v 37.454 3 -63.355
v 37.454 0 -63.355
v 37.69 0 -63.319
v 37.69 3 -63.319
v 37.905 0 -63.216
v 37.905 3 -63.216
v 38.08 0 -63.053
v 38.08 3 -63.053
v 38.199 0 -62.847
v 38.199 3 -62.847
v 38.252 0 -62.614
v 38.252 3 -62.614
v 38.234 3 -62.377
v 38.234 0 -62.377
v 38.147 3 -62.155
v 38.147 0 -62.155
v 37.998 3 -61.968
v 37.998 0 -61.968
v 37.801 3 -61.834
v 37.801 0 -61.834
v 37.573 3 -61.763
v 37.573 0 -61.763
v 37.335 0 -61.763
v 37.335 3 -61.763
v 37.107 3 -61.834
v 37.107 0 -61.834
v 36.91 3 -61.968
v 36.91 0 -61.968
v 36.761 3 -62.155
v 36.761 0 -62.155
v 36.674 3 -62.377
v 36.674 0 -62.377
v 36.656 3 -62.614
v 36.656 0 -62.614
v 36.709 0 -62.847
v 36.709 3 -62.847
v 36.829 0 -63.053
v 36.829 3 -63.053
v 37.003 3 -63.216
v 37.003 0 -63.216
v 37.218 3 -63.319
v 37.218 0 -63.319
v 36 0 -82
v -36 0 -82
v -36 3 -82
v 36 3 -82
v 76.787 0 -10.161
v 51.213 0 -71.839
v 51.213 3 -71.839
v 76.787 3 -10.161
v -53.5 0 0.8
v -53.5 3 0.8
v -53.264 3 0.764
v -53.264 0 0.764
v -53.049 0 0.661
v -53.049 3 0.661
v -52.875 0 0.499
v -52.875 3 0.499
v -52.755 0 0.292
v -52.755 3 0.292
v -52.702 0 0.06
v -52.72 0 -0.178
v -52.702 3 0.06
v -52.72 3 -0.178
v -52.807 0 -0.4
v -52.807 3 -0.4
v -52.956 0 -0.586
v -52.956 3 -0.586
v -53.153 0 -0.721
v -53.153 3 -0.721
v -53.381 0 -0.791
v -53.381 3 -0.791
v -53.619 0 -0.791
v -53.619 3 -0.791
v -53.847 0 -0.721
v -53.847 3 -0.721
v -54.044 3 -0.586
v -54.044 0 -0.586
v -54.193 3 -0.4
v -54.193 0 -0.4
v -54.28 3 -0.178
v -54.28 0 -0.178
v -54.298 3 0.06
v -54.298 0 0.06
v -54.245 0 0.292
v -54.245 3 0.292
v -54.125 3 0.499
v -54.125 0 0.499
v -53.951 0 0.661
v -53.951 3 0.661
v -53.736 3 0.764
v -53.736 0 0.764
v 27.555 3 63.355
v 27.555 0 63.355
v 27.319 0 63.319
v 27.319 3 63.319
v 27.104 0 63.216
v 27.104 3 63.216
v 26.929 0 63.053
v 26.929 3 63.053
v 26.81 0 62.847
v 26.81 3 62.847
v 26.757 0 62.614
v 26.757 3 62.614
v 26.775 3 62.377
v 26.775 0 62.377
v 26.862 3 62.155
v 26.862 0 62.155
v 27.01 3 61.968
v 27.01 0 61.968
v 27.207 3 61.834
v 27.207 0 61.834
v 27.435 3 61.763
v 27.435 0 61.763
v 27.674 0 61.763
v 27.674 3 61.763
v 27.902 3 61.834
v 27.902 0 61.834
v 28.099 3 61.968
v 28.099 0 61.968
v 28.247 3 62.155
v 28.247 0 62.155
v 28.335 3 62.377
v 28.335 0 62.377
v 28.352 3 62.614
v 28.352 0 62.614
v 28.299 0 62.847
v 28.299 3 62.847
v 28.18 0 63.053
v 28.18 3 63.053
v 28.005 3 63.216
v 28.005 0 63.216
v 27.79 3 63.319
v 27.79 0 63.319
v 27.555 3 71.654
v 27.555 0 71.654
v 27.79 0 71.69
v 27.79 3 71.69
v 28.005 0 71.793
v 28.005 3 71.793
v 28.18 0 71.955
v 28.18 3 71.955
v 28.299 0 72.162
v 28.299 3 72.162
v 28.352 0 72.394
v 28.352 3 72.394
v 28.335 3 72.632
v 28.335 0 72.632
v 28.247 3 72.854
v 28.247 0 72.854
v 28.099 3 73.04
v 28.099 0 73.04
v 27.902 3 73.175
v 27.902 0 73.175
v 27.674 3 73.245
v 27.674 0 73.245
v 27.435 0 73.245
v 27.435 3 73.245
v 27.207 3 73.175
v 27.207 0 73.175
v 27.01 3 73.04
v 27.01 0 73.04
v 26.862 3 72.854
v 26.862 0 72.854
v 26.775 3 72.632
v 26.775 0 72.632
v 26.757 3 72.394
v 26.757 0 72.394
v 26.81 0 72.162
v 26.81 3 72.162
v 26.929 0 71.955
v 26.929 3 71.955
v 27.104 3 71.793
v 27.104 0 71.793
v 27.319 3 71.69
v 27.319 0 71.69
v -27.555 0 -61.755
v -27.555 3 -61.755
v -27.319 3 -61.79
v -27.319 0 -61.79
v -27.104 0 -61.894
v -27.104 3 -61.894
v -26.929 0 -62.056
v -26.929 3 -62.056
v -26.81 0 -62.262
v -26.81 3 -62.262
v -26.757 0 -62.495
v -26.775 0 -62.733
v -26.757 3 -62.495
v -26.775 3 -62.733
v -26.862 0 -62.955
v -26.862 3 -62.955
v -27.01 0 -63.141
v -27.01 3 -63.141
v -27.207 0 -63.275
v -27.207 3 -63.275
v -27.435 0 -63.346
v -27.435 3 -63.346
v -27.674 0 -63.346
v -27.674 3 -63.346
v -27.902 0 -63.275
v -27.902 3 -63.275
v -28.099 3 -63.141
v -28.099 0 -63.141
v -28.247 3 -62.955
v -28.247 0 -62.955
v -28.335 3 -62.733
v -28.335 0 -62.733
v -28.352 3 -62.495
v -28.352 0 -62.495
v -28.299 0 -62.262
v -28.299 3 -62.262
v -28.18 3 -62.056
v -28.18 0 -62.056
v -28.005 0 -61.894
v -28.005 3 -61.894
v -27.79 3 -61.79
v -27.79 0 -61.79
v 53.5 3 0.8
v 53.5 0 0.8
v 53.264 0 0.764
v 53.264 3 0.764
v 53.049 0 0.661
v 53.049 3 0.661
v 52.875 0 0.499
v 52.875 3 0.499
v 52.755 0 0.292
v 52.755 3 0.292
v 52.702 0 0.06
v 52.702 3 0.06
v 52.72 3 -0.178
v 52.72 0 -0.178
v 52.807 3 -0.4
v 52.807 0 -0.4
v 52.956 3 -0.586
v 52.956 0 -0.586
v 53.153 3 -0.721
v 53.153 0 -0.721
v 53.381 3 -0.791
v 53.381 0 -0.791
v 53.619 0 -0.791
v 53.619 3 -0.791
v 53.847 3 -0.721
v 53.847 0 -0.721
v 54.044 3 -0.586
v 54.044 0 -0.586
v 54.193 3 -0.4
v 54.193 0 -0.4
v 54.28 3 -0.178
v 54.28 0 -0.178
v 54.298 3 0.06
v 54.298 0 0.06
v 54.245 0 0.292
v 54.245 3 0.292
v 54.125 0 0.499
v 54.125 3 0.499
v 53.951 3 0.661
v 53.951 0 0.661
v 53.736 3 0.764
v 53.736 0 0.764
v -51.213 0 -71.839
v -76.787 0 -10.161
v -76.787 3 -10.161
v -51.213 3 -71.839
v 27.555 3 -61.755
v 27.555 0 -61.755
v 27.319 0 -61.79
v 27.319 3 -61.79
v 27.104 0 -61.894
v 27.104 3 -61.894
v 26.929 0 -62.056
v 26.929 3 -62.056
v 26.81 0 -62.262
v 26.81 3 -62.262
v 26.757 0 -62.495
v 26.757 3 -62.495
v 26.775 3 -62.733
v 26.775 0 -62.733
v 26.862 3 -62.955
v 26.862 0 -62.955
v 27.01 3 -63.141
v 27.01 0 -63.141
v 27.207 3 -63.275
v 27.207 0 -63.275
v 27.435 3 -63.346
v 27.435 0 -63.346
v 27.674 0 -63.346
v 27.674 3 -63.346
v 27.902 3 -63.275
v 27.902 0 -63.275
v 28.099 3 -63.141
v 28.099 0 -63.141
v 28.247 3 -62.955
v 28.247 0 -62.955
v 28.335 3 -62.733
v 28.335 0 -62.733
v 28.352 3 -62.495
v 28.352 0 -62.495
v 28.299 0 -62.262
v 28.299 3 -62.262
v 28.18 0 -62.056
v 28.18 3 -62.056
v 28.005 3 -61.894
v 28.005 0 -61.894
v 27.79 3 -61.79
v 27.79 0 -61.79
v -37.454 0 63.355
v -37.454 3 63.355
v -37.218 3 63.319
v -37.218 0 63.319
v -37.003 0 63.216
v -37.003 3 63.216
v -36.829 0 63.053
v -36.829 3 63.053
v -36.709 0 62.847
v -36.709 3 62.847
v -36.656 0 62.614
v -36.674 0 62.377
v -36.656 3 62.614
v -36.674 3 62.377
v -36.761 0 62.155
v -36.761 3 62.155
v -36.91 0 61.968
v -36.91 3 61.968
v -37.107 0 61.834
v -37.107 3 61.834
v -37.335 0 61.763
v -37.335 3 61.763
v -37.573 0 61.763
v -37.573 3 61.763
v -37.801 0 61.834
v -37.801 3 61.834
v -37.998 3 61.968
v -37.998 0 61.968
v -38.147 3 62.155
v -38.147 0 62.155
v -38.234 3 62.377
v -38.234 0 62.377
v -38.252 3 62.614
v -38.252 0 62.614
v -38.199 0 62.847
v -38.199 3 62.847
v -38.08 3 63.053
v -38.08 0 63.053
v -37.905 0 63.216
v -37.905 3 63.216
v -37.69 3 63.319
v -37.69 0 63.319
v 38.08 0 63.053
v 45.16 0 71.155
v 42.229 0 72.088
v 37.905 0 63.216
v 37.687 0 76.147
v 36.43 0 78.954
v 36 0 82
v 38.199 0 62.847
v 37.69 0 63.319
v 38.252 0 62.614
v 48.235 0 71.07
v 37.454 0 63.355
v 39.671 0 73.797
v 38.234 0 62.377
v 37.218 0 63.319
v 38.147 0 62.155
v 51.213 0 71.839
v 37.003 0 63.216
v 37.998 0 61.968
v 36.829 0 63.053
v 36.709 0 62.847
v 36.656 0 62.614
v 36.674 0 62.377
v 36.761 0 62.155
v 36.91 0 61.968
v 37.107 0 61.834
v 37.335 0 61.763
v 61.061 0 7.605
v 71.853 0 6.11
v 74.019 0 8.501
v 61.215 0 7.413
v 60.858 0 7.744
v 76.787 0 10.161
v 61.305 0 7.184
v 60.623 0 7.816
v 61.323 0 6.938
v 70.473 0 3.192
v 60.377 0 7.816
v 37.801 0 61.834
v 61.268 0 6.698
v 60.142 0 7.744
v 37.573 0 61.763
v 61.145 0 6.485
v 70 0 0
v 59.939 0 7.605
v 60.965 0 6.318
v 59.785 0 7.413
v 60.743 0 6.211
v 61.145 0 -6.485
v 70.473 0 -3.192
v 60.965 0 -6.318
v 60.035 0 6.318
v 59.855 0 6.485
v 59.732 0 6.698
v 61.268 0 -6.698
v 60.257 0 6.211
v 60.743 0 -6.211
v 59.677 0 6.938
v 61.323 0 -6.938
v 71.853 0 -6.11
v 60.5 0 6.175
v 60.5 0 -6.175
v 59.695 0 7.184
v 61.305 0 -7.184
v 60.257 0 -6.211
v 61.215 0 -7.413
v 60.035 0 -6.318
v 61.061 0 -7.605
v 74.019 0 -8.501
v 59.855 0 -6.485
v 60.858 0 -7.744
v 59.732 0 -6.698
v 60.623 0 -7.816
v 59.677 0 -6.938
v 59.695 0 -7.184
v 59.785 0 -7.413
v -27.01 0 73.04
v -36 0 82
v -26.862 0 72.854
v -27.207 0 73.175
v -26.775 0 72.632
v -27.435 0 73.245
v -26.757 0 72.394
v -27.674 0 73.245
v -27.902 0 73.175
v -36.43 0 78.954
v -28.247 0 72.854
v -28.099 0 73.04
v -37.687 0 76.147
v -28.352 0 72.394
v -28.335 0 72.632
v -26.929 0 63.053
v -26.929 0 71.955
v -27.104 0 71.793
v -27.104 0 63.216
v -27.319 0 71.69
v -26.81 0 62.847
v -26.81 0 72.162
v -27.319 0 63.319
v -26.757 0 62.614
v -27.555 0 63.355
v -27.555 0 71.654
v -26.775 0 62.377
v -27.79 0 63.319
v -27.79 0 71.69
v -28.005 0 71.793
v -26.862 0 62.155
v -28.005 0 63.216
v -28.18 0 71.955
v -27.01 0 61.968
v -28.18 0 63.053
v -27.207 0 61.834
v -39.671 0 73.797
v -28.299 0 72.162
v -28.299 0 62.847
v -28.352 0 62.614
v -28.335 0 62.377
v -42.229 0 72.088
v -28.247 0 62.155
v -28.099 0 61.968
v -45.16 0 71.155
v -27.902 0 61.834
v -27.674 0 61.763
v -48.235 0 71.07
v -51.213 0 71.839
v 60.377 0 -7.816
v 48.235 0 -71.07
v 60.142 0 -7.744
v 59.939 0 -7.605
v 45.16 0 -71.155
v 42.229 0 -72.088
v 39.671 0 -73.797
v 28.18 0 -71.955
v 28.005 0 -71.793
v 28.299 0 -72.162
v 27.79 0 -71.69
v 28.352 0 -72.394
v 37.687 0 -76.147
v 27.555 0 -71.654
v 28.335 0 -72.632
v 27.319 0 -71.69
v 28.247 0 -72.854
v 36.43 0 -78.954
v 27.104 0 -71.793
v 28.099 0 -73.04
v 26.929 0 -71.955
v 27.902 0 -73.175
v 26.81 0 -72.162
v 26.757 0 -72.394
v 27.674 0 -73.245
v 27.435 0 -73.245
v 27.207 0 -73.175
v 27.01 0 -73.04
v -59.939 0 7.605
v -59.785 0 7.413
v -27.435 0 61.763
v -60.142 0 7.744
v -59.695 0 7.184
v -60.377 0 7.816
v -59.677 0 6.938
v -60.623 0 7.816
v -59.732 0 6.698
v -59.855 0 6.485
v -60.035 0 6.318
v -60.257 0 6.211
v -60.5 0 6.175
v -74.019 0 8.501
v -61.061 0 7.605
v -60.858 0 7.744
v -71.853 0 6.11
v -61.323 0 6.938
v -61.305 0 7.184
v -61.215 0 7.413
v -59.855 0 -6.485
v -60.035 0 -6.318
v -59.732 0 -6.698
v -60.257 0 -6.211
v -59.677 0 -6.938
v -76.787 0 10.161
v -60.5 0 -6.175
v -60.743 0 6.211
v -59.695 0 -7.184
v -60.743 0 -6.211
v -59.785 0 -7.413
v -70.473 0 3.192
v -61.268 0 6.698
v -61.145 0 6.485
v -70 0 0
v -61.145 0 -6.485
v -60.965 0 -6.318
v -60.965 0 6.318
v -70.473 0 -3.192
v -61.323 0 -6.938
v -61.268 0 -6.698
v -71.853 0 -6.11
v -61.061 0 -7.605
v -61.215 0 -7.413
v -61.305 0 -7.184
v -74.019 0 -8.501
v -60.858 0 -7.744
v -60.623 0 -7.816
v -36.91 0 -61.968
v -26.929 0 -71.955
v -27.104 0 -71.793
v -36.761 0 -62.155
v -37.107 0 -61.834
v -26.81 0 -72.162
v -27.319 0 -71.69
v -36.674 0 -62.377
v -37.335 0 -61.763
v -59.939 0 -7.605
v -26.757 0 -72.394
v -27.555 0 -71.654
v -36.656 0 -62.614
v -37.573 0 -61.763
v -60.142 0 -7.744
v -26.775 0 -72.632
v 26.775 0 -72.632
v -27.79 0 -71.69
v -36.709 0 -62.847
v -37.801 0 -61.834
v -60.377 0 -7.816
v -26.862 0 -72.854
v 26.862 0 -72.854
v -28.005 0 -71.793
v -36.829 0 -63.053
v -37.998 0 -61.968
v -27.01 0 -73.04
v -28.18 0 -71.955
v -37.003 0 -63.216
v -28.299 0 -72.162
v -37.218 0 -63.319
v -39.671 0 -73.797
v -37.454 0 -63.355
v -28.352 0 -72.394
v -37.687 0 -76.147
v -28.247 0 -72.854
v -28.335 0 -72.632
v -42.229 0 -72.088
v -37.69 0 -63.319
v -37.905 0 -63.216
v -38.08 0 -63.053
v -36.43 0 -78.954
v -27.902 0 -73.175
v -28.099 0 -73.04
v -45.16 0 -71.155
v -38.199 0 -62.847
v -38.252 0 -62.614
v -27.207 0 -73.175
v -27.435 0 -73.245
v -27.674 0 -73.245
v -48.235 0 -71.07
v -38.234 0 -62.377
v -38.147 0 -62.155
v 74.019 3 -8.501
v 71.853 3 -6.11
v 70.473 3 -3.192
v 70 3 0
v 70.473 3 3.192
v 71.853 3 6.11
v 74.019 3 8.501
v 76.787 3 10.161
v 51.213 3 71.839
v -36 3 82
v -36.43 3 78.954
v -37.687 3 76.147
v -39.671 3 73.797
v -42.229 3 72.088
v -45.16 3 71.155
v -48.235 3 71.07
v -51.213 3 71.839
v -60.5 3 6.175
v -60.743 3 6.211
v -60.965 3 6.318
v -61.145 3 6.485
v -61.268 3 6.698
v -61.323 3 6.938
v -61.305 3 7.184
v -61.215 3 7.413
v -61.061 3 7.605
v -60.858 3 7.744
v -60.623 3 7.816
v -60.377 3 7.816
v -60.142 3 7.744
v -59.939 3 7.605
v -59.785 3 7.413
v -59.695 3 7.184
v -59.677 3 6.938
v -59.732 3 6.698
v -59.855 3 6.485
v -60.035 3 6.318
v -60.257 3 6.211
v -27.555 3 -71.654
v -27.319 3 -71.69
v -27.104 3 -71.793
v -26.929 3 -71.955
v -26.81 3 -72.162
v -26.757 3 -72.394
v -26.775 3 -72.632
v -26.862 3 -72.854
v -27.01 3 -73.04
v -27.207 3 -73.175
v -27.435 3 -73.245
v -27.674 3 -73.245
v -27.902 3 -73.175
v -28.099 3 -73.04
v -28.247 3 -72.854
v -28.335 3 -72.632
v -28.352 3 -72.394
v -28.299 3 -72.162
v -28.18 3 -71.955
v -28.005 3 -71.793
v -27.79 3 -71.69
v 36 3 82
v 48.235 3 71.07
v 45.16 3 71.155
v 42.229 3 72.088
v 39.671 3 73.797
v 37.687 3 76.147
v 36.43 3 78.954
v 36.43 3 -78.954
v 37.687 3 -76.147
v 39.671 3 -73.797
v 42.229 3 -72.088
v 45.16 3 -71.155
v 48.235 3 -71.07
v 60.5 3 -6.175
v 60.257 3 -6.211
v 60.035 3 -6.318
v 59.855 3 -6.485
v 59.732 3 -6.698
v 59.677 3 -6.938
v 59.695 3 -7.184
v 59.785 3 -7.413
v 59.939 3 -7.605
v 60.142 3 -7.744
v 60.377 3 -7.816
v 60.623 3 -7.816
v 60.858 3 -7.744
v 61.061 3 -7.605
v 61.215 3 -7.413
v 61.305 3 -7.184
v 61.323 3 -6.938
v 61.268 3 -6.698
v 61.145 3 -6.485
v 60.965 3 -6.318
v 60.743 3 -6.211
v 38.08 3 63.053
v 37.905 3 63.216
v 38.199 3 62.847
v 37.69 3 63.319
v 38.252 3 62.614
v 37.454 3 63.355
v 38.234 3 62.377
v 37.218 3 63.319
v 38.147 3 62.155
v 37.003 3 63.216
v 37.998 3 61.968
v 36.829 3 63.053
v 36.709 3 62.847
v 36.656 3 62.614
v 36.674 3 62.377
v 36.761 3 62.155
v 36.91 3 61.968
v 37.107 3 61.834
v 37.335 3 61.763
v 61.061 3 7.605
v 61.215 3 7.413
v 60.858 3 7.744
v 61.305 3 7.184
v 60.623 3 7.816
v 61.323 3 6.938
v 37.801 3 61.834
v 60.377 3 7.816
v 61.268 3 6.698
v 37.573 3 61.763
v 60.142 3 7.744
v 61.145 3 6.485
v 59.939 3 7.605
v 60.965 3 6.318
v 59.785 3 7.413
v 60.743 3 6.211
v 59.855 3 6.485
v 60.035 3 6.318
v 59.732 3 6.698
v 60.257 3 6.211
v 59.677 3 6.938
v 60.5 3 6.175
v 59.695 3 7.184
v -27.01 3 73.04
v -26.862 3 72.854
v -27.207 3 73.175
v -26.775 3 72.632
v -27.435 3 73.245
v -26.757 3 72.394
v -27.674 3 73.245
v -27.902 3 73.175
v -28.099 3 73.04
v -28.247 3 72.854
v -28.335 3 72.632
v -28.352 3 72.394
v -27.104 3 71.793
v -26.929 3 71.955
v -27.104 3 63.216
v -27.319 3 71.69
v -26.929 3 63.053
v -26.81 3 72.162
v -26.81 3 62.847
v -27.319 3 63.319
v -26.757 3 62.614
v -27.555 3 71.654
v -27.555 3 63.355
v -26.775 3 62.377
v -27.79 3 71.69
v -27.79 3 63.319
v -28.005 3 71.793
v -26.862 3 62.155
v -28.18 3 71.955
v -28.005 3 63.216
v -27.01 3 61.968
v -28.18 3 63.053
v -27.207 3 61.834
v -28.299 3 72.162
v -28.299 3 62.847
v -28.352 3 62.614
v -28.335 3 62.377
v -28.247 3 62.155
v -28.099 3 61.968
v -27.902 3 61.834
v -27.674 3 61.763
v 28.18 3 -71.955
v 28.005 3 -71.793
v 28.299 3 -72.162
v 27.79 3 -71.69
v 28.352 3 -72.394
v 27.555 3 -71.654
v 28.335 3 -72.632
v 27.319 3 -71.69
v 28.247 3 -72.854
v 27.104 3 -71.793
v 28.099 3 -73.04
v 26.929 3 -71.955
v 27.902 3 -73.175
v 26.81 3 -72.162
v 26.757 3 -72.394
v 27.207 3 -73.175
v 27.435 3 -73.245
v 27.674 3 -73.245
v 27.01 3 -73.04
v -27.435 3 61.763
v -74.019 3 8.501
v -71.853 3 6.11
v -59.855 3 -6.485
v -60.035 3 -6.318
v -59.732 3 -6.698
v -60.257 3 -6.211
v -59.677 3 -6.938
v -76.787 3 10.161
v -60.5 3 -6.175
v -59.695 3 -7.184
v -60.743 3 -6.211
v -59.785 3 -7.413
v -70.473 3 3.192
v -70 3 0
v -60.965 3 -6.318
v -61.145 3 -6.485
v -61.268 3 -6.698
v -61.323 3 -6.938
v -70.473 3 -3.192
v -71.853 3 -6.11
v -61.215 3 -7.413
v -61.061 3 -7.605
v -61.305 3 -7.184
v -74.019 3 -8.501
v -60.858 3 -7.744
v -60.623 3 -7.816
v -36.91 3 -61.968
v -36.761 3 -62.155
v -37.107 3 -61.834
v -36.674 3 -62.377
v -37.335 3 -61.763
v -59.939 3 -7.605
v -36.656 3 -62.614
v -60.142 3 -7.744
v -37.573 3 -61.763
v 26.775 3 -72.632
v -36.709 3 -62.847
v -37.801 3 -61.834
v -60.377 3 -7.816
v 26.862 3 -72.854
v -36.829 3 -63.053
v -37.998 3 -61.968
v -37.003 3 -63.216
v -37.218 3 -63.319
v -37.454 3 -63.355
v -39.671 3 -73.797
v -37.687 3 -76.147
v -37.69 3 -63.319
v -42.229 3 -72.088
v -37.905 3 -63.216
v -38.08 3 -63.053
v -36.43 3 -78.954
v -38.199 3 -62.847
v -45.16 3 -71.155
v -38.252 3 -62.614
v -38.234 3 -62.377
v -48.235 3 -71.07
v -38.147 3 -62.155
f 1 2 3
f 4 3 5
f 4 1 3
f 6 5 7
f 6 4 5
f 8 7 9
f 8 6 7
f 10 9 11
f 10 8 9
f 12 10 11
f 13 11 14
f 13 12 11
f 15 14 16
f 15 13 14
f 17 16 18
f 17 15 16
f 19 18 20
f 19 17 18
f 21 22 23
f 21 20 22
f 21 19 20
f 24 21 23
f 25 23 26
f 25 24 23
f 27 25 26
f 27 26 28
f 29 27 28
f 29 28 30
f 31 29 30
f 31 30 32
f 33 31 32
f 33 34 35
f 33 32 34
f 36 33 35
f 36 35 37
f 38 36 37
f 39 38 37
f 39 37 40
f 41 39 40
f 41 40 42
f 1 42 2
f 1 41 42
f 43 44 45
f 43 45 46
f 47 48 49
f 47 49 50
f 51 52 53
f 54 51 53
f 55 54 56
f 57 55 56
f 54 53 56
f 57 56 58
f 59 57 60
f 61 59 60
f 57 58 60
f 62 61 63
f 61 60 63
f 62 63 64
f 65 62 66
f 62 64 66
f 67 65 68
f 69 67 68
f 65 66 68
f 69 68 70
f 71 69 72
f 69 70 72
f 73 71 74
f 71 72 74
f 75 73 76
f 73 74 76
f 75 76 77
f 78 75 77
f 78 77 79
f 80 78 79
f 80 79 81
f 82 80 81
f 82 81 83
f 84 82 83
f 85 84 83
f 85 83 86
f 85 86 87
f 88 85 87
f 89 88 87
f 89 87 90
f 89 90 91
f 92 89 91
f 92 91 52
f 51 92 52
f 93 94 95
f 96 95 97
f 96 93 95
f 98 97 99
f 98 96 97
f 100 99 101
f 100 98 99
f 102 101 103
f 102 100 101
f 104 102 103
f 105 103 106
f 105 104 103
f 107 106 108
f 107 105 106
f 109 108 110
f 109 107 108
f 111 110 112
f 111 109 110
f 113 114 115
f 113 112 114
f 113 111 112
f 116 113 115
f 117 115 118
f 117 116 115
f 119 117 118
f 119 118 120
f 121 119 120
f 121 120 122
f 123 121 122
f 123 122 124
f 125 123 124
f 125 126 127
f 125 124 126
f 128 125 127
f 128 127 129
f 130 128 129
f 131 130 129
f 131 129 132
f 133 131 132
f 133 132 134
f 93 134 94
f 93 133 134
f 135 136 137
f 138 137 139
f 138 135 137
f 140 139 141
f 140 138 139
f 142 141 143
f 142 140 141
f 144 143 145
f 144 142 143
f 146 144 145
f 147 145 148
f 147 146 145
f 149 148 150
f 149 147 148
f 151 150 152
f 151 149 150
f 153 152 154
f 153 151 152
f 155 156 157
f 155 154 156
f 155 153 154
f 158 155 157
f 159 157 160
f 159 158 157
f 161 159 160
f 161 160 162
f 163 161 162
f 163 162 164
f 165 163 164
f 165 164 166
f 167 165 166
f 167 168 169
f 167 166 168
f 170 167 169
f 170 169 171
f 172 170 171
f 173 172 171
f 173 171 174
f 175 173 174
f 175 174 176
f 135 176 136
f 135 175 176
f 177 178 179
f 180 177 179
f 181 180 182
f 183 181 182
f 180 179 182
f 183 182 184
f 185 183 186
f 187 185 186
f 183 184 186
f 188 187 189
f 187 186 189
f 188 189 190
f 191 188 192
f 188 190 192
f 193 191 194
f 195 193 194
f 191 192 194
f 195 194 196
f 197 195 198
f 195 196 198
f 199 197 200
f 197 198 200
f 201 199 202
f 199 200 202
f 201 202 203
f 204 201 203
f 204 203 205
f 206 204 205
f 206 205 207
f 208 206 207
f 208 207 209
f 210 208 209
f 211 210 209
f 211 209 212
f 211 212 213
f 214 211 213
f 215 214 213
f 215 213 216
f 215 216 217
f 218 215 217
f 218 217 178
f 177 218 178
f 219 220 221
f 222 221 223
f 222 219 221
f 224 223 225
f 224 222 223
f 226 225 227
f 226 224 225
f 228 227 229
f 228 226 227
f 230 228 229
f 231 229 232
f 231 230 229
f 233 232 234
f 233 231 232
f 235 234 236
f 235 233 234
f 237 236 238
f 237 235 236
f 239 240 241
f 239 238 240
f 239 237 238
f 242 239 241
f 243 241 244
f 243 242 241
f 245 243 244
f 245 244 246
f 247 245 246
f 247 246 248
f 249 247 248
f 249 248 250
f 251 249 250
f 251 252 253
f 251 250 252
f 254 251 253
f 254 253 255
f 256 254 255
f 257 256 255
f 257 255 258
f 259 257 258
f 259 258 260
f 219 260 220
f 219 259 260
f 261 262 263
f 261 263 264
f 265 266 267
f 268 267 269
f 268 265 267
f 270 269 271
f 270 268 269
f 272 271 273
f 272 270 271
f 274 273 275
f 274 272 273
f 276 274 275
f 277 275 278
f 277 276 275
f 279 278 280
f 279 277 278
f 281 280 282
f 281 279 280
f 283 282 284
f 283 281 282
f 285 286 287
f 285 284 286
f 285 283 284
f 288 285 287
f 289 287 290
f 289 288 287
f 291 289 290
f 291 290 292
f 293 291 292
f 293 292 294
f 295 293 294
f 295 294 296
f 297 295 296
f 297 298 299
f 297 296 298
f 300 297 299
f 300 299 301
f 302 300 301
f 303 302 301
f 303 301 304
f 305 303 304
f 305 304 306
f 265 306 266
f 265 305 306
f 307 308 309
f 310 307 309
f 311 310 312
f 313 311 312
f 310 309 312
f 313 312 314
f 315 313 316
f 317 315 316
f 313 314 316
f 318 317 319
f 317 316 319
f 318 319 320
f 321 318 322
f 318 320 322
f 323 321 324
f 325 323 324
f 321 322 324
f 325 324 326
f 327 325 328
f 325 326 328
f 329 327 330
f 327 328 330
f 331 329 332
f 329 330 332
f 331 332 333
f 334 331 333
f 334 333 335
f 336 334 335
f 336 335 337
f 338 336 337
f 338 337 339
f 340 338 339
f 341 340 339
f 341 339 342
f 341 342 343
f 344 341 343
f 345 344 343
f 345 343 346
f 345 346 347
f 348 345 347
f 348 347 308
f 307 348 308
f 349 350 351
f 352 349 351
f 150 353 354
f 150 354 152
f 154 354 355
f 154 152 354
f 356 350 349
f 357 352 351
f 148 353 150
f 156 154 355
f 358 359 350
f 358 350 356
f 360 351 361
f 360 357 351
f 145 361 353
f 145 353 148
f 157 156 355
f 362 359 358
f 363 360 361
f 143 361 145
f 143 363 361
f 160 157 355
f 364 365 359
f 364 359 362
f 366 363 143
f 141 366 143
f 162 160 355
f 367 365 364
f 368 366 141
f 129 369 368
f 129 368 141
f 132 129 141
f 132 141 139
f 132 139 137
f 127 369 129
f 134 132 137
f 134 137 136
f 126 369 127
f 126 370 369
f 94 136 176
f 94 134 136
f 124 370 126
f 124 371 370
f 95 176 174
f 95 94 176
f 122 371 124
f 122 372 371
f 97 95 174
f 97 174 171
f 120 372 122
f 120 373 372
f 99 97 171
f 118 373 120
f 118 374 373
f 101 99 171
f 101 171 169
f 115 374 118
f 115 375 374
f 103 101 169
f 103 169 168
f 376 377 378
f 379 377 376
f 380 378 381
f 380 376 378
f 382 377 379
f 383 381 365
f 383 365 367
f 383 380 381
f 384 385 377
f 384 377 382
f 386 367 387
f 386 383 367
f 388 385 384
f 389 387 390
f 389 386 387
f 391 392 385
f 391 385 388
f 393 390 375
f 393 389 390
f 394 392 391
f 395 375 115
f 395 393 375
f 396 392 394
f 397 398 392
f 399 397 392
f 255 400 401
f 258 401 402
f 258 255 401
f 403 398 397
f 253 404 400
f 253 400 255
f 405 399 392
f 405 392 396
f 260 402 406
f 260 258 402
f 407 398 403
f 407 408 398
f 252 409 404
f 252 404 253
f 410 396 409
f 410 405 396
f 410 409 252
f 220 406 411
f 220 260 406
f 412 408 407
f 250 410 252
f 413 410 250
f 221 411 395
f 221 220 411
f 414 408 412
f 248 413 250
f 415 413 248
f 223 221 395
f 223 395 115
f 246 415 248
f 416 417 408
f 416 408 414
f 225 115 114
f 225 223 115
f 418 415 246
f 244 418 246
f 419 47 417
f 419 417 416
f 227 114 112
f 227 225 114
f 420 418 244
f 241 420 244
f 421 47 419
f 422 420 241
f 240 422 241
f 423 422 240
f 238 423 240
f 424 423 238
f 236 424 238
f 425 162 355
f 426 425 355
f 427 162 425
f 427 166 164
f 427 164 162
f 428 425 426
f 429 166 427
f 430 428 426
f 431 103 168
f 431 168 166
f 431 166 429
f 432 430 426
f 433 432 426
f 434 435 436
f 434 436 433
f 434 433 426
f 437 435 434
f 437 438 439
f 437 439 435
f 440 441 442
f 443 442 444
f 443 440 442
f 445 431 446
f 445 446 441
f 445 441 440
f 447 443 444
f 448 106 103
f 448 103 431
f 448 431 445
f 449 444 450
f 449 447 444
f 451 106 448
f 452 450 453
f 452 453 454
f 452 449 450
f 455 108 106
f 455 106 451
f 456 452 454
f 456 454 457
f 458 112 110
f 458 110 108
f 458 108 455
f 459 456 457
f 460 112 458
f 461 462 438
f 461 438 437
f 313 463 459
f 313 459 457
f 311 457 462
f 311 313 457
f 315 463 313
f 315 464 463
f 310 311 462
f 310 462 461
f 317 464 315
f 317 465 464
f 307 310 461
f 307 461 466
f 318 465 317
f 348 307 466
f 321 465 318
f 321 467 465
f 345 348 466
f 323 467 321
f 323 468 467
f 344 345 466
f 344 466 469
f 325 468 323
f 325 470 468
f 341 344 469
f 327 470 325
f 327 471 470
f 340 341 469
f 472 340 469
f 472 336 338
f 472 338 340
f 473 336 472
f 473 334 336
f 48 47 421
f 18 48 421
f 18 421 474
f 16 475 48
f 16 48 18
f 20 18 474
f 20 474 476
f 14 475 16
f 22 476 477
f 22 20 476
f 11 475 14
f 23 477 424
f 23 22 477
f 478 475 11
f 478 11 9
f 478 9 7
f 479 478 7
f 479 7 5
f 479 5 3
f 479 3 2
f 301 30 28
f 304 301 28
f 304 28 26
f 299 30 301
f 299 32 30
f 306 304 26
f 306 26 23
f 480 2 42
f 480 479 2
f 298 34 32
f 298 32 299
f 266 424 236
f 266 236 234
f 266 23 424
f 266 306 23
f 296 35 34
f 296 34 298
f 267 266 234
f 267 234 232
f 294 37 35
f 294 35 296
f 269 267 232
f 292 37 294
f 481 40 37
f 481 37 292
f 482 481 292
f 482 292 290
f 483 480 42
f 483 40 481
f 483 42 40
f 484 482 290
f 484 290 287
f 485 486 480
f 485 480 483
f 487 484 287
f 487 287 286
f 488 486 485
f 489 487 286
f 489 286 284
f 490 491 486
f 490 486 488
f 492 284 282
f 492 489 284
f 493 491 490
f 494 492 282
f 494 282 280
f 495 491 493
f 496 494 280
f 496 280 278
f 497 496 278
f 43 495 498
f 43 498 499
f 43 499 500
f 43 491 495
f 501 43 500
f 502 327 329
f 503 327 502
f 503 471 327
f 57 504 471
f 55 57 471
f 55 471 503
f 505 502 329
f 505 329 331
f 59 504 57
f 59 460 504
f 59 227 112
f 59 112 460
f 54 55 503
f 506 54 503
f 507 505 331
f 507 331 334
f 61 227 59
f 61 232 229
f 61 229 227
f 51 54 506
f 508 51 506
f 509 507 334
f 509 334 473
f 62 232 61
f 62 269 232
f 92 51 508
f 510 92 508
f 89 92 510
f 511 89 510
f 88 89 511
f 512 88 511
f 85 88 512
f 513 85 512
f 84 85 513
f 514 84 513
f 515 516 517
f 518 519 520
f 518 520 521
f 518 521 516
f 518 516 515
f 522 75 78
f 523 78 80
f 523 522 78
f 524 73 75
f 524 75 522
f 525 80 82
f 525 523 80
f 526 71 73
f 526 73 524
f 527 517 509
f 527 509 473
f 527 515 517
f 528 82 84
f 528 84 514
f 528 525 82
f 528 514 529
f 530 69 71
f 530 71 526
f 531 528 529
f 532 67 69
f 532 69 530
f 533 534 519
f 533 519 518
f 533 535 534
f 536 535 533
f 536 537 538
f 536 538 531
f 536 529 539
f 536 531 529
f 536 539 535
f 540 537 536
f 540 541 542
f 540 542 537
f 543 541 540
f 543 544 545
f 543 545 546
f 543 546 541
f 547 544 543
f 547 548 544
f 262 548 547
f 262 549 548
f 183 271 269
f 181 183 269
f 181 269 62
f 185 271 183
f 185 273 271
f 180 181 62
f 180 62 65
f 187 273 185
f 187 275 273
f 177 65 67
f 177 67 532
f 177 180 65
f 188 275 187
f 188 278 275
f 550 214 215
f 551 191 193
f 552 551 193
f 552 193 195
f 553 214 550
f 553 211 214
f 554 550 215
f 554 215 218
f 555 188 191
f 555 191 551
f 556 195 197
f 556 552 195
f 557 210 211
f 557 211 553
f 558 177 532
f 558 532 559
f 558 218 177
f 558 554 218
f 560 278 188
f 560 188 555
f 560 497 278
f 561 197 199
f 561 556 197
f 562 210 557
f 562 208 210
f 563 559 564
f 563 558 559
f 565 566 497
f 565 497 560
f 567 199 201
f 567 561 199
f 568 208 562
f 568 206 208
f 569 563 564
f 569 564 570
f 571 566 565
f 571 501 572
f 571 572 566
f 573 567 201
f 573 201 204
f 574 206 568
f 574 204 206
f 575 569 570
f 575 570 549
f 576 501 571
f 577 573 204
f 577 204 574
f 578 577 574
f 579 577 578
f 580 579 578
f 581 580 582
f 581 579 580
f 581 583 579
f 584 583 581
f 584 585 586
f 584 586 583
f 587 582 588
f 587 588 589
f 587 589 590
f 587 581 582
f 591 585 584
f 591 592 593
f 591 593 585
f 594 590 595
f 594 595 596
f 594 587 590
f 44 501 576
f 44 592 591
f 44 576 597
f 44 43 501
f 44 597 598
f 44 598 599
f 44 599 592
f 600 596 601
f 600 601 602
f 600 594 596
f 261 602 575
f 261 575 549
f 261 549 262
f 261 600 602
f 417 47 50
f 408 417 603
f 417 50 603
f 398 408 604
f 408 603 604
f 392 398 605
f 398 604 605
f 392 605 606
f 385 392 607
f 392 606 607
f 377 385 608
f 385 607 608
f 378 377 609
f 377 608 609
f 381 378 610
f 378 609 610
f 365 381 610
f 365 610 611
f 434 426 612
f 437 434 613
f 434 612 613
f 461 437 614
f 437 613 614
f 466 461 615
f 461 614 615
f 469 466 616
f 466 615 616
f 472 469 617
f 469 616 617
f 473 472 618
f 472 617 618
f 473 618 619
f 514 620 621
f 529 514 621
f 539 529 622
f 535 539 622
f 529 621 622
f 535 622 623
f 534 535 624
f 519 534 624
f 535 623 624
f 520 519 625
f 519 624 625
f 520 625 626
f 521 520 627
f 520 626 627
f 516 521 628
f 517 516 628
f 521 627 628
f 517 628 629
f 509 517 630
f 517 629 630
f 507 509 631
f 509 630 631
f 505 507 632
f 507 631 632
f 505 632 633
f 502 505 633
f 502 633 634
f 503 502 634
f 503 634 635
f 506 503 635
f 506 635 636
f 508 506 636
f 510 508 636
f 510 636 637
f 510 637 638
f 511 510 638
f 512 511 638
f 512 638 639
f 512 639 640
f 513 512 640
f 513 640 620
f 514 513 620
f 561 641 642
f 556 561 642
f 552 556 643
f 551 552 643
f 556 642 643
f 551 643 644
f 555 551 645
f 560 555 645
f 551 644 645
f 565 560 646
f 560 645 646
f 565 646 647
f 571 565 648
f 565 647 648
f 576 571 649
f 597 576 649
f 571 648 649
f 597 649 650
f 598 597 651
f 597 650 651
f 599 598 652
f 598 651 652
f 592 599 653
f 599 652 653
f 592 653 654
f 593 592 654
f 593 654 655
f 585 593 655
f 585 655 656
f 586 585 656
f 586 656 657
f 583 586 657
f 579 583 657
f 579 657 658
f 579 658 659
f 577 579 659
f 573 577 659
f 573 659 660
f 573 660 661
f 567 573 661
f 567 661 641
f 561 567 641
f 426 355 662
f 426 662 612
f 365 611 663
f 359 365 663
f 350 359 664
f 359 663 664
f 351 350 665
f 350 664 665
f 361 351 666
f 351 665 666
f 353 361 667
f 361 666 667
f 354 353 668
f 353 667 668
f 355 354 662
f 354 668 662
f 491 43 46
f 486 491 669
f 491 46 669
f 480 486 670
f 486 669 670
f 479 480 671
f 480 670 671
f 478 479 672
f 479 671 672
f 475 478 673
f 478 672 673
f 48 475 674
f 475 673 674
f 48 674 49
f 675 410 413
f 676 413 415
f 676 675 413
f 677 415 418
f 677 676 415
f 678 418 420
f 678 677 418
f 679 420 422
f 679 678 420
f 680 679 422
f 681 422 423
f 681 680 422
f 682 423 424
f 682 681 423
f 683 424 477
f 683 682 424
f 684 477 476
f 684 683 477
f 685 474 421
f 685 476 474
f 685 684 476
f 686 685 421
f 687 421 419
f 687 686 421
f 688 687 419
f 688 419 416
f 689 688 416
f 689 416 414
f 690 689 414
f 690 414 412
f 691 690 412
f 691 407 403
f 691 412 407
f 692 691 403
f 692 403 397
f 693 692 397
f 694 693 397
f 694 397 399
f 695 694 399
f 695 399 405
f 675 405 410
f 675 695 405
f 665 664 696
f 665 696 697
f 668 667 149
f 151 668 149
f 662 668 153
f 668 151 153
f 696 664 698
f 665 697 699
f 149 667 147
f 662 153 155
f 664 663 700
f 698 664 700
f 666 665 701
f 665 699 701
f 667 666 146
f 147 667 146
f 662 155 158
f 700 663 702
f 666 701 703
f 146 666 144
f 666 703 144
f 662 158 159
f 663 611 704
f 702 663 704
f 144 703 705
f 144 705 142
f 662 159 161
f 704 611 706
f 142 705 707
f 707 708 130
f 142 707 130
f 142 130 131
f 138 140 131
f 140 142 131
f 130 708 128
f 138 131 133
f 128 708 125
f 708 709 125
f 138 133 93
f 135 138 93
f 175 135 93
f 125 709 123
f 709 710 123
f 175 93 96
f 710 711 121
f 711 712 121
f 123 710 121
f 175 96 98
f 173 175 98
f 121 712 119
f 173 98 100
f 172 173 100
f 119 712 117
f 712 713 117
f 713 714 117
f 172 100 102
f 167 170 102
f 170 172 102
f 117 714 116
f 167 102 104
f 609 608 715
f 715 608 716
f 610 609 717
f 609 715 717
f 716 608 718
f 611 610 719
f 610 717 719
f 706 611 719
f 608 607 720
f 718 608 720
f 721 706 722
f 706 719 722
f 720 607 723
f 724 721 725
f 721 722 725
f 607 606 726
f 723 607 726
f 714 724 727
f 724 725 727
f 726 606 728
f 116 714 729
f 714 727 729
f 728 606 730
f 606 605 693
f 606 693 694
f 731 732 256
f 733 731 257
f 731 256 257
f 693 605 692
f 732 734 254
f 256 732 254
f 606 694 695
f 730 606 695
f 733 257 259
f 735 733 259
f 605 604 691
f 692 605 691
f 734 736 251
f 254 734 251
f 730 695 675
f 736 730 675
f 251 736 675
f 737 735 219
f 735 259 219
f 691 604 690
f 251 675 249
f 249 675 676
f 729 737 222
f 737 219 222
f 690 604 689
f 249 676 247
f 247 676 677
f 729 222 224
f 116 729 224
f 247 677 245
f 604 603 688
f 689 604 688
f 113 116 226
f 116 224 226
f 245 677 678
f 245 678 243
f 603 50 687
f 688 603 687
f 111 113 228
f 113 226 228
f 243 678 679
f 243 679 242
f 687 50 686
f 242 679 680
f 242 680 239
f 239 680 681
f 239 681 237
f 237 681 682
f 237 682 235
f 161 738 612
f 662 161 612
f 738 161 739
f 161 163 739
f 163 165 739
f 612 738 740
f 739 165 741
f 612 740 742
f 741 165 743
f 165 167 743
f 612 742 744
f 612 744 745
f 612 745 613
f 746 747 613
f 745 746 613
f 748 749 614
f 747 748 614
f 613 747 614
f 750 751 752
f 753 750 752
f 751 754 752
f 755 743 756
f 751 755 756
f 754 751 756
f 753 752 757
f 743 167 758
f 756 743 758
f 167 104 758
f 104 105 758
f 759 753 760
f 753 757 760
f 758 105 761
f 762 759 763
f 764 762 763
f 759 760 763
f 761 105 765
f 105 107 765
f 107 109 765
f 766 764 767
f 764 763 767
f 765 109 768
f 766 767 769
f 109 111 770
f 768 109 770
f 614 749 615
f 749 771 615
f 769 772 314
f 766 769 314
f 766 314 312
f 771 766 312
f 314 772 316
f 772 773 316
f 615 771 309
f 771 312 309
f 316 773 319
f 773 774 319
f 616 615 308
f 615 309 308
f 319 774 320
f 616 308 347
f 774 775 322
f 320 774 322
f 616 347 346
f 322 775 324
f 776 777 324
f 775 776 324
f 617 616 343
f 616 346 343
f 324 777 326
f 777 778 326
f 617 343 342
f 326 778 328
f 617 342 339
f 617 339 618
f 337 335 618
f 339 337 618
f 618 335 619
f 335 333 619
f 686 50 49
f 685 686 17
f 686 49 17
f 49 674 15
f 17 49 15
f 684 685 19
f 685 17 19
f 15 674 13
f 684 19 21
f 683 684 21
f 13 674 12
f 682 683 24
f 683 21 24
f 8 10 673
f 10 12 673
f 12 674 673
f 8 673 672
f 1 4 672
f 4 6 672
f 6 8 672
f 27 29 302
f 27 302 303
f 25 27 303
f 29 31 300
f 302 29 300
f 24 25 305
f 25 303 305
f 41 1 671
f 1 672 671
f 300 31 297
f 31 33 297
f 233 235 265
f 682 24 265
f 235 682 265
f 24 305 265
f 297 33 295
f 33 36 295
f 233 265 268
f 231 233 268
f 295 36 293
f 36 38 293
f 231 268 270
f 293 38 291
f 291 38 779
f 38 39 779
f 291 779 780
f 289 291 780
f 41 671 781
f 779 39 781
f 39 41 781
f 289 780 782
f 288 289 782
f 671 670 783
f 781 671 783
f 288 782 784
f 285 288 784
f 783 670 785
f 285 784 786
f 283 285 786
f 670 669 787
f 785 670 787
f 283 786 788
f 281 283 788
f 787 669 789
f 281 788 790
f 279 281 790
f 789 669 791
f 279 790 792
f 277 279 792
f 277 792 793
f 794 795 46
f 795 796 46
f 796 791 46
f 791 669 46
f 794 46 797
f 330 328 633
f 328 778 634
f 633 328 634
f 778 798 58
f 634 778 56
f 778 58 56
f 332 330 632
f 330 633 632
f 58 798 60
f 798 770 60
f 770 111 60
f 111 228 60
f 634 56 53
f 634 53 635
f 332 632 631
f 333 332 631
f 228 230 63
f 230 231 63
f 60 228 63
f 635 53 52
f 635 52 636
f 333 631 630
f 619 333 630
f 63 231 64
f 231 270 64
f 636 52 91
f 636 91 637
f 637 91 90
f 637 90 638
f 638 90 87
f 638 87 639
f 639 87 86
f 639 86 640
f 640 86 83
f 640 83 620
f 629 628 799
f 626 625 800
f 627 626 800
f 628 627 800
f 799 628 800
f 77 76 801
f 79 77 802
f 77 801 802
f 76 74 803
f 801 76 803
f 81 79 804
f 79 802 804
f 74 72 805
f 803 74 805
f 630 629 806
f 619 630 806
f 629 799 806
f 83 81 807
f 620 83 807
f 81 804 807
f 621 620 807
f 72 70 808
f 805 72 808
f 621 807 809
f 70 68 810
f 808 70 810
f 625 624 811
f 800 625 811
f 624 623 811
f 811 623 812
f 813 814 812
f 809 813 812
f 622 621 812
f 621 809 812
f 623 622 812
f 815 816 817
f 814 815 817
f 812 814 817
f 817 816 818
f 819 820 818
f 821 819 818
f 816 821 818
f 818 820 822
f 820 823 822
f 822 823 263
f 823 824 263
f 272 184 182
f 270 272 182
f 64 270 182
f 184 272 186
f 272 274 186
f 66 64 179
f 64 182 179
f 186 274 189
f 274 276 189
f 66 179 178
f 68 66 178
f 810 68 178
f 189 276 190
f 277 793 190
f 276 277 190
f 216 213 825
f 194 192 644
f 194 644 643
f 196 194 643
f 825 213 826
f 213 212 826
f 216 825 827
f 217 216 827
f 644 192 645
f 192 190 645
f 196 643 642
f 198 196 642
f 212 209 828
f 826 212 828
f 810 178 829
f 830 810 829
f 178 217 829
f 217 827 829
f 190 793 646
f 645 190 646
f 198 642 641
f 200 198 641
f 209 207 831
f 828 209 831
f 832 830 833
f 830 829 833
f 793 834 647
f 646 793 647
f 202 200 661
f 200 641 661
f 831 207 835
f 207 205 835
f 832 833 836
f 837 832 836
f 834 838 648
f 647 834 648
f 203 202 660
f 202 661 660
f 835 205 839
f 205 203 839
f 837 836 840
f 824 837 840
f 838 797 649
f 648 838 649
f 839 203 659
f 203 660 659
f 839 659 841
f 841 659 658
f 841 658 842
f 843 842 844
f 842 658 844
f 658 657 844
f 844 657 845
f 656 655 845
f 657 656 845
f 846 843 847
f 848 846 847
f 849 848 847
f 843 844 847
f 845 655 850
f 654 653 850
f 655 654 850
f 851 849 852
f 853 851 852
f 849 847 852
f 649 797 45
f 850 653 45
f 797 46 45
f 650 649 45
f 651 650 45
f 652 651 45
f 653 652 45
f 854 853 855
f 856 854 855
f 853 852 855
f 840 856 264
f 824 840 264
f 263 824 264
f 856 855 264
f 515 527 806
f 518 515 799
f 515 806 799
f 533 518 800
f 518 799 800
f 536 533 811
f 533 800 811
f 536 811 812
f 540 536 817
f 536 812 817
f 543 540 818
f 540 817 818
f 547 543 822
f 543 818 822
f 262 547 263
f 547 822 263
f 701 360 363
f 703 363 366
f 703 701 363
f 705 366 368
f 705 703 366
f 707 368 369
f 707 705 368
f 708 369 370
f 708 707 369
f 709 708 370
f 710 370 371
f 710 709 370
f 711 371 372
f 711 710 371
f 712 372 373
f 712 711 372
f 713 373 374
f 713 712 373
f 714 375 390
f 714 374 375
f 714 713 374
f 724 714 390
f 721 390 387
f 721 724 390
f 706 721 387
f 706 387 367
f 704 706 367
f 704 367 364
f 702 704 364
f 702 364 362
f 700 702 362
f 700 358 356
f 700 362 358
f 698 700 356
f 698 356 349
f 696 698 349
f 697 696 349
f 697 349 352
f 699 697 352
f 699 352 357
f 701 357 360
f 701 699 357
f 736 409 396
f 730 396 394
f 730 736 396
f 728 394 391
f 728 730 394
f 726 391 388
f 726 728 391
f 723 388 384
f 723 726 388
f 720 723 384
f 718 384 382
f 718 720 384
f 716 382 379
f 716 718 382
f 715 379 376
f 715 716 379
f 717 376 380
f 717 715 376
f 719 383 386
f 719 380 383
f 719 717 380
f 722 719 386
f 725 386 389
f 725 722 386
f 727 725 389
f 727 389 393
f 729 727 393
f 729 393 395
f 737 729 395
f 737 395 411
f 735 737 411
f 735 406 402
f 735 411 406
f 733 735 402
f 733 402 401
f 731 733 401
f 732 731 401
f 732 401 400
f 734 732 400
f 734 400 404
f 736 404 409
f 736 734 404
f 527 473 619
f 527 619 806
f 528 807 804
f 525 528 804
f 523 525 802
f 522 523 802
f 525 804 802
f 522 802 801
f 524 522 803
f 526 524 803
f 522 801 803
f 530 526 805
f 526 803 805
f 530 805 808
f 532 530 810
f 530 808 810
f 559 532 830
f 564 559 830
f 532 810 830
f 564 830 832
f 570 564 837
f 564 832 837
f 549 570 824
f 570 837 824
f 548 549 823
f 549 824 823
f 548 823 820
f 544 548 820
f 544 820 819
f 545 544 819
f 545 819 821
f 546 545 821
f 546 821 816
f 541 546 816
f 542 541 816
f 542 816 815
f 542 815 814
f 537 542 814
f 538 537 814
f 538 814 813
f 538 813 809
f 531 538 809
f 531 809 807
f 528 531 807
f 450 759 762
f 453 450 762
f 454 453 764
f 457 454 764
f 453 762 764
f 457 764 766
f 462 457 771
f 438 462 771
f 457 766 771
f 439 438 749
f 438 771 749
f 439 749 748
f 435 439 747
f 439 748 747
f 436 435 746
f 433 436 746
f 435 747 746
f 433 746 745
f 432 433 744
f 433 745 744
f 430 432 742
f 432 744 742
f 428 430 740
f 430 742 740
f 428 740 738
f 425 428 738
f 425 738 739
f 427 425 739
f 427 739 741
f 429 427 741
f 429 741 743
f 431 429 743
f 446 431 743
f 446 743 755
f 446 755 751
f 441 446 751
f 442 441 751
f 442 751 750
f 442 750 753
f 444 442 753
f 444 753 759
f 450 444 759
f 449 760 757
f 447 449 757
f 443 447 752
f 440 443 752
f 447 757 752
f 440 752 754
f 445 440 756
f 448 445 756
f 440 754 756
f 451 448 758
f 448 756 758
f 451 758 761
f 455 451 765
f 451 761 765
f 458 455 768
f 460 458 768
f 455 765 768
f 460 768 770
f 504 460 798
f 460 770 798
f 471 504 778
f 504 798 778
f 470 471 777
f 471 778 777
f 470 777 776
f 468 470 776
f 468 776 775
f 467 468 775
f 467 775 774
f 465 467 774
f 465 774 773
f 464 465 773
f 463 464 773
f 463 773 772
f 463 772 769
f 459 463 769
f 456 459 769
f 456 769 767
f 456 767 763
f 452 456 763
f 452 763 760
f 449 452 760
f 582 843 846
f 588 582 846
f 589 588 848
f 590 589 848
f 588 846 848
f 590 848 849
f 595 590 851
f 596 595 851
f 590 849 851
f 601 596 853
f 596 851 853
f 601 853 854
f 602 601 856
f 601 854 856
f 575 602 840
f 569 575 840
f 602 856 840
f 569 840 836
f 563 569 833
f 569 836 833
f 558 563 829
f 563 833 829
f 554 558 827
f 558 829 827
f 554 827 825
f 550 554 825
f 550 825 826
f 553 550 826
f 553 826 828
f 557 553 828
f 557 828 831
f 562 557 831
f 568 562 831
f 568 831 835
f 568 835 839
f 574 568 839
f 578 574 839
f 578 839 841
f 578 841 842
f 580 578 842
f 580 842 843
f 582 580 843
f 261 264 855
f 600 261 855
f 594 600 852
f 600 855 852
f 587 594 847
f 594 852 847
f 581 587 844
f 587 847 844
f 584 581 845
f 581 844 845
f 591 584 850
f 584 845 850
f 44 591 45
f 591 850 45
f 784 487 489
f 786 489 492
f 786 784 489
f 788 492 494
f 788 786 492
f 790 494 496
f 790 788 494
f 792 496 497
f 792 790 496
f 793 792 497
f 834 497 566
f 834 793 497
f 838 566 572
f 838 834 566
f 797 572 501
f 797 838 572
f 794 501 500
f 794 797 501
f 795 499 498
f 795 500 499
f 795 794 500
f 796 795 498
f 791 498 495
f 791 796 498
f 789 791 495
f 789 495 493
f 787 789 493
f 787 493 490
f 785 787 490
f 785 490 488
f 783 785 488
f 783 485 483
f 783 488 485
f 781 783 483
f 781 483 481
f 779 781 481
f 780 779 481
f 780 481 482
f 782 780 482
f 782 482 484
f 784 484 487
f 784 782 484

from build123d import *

# Parameters (mm, degrees)
EXTRUDE_1_DEPTH     = 3
SKETCH_7_R          = 11
CUT_EXTRUDE_4_DEPTH = 116.299609713
SKETCH_9_R          = 0.8
SKETCH_9_R_2        = 0.825279091
CUT_EXTRUDE_5_DEPTH = 113.379793517


with BuildPart() as part:
    # 草图4 → 凸台-拉伸1 (new body)
    with BuildSketch(Plane(origin=(0, 0, 0), x_dir=(1, 0, 0), z_dir=(0, 1, 0))):
        Polygon((-47, 82), (47, 82), (81, 0), (47, -82), (-47, -82), (-81, 0), align=None)
    extrude(amount=EXTRUDE_1_DEPTH)

    # 草图7 → 切除-拉伸4 (cut, through all)
    with BuildSketch(Plane(origin=(0, 3, 0), x_dir=(1, 0, 0), z_dir=(0, 1, 0))):
        with Locations((-81, 0)):
            Circle(SKETCH_7_R)
        with Locations((-47, 82)):
            Circle(SKETCH_7_R)
        with Locations((47, 82)):
            Circle(SKETCH_7_R)
        with Locations((81, 0)):
            Circle(SKETCH_7_R)
        with Locations((47, -82)):
            Circle(SKETCH_7_R)
        with Locations((-47, -82)):
            Circle(SKETCH_7_R)
    extrude(amount=-CUT_EXTRUDE_4_DEPTH, mode=Mode.SUBTRACT)

    # 草图9 → 切除-拉伸5 (cut, through all)
    with BuildSketch(Plane(origin=(0, 3, 0), x_dir=(1, 0, 0), z_dir=(0, 1, 0))):
        with Locations(Location((-53.5, 0, 0), (0, 0, 270))):
            Circle(SKETCH_9_R)
        with Locations(Location((-60.5, 7, 0), (0, 0, 270))):
            Circle(SKETCH_9_R_2)
        with Locations(Location((-60.5, -7, 0), (0, 0, 90))):
            Circle(SKETCH_9_R_2)
        with Locations(Location((-27.554563517, -62.554563517, 0), (0, 0, 270))):
            Circle(SKETCH_9_R)
        with Locations(Location((-37.454058454, -62.554563517, 0), (0, 0, 270))):
            Circle(SKETCH_9_R)
        with Locations(Location((-27.554563517, -72.454058454, 0), (0, 0, 90))):
            Circle(SKETCH_9_R)
        with Locations(Location((-27.554563517, 62.554563517, 0), (0, 0, 270))):
            Circle(SKETCH_9_R)
        with Locations(Location((-27.554563517, 72.454058454, 0), (0, 0, 270))):
            Circle(SKETCH_9_R)
        with Locations(Location((-37.454058454, 62.554563517, 0), (0, 0, 90))):
            Circle(SKETCH_9_R)
    cut_extrude_5 = extrude(amount=-CUT_EXTRUDE_5_DEPTH, mode=Mode.SUBTRACT)

    # 镜向2: 切除-拉伸5 across plane
    add(cut_extrude_5.mirror(Plane(origin=(0, 0, 0), x_dir=(0, 0, 1), z_dir=(1, 0, 0))), mode=Mode.SUBTRACT)


solid = part.part
